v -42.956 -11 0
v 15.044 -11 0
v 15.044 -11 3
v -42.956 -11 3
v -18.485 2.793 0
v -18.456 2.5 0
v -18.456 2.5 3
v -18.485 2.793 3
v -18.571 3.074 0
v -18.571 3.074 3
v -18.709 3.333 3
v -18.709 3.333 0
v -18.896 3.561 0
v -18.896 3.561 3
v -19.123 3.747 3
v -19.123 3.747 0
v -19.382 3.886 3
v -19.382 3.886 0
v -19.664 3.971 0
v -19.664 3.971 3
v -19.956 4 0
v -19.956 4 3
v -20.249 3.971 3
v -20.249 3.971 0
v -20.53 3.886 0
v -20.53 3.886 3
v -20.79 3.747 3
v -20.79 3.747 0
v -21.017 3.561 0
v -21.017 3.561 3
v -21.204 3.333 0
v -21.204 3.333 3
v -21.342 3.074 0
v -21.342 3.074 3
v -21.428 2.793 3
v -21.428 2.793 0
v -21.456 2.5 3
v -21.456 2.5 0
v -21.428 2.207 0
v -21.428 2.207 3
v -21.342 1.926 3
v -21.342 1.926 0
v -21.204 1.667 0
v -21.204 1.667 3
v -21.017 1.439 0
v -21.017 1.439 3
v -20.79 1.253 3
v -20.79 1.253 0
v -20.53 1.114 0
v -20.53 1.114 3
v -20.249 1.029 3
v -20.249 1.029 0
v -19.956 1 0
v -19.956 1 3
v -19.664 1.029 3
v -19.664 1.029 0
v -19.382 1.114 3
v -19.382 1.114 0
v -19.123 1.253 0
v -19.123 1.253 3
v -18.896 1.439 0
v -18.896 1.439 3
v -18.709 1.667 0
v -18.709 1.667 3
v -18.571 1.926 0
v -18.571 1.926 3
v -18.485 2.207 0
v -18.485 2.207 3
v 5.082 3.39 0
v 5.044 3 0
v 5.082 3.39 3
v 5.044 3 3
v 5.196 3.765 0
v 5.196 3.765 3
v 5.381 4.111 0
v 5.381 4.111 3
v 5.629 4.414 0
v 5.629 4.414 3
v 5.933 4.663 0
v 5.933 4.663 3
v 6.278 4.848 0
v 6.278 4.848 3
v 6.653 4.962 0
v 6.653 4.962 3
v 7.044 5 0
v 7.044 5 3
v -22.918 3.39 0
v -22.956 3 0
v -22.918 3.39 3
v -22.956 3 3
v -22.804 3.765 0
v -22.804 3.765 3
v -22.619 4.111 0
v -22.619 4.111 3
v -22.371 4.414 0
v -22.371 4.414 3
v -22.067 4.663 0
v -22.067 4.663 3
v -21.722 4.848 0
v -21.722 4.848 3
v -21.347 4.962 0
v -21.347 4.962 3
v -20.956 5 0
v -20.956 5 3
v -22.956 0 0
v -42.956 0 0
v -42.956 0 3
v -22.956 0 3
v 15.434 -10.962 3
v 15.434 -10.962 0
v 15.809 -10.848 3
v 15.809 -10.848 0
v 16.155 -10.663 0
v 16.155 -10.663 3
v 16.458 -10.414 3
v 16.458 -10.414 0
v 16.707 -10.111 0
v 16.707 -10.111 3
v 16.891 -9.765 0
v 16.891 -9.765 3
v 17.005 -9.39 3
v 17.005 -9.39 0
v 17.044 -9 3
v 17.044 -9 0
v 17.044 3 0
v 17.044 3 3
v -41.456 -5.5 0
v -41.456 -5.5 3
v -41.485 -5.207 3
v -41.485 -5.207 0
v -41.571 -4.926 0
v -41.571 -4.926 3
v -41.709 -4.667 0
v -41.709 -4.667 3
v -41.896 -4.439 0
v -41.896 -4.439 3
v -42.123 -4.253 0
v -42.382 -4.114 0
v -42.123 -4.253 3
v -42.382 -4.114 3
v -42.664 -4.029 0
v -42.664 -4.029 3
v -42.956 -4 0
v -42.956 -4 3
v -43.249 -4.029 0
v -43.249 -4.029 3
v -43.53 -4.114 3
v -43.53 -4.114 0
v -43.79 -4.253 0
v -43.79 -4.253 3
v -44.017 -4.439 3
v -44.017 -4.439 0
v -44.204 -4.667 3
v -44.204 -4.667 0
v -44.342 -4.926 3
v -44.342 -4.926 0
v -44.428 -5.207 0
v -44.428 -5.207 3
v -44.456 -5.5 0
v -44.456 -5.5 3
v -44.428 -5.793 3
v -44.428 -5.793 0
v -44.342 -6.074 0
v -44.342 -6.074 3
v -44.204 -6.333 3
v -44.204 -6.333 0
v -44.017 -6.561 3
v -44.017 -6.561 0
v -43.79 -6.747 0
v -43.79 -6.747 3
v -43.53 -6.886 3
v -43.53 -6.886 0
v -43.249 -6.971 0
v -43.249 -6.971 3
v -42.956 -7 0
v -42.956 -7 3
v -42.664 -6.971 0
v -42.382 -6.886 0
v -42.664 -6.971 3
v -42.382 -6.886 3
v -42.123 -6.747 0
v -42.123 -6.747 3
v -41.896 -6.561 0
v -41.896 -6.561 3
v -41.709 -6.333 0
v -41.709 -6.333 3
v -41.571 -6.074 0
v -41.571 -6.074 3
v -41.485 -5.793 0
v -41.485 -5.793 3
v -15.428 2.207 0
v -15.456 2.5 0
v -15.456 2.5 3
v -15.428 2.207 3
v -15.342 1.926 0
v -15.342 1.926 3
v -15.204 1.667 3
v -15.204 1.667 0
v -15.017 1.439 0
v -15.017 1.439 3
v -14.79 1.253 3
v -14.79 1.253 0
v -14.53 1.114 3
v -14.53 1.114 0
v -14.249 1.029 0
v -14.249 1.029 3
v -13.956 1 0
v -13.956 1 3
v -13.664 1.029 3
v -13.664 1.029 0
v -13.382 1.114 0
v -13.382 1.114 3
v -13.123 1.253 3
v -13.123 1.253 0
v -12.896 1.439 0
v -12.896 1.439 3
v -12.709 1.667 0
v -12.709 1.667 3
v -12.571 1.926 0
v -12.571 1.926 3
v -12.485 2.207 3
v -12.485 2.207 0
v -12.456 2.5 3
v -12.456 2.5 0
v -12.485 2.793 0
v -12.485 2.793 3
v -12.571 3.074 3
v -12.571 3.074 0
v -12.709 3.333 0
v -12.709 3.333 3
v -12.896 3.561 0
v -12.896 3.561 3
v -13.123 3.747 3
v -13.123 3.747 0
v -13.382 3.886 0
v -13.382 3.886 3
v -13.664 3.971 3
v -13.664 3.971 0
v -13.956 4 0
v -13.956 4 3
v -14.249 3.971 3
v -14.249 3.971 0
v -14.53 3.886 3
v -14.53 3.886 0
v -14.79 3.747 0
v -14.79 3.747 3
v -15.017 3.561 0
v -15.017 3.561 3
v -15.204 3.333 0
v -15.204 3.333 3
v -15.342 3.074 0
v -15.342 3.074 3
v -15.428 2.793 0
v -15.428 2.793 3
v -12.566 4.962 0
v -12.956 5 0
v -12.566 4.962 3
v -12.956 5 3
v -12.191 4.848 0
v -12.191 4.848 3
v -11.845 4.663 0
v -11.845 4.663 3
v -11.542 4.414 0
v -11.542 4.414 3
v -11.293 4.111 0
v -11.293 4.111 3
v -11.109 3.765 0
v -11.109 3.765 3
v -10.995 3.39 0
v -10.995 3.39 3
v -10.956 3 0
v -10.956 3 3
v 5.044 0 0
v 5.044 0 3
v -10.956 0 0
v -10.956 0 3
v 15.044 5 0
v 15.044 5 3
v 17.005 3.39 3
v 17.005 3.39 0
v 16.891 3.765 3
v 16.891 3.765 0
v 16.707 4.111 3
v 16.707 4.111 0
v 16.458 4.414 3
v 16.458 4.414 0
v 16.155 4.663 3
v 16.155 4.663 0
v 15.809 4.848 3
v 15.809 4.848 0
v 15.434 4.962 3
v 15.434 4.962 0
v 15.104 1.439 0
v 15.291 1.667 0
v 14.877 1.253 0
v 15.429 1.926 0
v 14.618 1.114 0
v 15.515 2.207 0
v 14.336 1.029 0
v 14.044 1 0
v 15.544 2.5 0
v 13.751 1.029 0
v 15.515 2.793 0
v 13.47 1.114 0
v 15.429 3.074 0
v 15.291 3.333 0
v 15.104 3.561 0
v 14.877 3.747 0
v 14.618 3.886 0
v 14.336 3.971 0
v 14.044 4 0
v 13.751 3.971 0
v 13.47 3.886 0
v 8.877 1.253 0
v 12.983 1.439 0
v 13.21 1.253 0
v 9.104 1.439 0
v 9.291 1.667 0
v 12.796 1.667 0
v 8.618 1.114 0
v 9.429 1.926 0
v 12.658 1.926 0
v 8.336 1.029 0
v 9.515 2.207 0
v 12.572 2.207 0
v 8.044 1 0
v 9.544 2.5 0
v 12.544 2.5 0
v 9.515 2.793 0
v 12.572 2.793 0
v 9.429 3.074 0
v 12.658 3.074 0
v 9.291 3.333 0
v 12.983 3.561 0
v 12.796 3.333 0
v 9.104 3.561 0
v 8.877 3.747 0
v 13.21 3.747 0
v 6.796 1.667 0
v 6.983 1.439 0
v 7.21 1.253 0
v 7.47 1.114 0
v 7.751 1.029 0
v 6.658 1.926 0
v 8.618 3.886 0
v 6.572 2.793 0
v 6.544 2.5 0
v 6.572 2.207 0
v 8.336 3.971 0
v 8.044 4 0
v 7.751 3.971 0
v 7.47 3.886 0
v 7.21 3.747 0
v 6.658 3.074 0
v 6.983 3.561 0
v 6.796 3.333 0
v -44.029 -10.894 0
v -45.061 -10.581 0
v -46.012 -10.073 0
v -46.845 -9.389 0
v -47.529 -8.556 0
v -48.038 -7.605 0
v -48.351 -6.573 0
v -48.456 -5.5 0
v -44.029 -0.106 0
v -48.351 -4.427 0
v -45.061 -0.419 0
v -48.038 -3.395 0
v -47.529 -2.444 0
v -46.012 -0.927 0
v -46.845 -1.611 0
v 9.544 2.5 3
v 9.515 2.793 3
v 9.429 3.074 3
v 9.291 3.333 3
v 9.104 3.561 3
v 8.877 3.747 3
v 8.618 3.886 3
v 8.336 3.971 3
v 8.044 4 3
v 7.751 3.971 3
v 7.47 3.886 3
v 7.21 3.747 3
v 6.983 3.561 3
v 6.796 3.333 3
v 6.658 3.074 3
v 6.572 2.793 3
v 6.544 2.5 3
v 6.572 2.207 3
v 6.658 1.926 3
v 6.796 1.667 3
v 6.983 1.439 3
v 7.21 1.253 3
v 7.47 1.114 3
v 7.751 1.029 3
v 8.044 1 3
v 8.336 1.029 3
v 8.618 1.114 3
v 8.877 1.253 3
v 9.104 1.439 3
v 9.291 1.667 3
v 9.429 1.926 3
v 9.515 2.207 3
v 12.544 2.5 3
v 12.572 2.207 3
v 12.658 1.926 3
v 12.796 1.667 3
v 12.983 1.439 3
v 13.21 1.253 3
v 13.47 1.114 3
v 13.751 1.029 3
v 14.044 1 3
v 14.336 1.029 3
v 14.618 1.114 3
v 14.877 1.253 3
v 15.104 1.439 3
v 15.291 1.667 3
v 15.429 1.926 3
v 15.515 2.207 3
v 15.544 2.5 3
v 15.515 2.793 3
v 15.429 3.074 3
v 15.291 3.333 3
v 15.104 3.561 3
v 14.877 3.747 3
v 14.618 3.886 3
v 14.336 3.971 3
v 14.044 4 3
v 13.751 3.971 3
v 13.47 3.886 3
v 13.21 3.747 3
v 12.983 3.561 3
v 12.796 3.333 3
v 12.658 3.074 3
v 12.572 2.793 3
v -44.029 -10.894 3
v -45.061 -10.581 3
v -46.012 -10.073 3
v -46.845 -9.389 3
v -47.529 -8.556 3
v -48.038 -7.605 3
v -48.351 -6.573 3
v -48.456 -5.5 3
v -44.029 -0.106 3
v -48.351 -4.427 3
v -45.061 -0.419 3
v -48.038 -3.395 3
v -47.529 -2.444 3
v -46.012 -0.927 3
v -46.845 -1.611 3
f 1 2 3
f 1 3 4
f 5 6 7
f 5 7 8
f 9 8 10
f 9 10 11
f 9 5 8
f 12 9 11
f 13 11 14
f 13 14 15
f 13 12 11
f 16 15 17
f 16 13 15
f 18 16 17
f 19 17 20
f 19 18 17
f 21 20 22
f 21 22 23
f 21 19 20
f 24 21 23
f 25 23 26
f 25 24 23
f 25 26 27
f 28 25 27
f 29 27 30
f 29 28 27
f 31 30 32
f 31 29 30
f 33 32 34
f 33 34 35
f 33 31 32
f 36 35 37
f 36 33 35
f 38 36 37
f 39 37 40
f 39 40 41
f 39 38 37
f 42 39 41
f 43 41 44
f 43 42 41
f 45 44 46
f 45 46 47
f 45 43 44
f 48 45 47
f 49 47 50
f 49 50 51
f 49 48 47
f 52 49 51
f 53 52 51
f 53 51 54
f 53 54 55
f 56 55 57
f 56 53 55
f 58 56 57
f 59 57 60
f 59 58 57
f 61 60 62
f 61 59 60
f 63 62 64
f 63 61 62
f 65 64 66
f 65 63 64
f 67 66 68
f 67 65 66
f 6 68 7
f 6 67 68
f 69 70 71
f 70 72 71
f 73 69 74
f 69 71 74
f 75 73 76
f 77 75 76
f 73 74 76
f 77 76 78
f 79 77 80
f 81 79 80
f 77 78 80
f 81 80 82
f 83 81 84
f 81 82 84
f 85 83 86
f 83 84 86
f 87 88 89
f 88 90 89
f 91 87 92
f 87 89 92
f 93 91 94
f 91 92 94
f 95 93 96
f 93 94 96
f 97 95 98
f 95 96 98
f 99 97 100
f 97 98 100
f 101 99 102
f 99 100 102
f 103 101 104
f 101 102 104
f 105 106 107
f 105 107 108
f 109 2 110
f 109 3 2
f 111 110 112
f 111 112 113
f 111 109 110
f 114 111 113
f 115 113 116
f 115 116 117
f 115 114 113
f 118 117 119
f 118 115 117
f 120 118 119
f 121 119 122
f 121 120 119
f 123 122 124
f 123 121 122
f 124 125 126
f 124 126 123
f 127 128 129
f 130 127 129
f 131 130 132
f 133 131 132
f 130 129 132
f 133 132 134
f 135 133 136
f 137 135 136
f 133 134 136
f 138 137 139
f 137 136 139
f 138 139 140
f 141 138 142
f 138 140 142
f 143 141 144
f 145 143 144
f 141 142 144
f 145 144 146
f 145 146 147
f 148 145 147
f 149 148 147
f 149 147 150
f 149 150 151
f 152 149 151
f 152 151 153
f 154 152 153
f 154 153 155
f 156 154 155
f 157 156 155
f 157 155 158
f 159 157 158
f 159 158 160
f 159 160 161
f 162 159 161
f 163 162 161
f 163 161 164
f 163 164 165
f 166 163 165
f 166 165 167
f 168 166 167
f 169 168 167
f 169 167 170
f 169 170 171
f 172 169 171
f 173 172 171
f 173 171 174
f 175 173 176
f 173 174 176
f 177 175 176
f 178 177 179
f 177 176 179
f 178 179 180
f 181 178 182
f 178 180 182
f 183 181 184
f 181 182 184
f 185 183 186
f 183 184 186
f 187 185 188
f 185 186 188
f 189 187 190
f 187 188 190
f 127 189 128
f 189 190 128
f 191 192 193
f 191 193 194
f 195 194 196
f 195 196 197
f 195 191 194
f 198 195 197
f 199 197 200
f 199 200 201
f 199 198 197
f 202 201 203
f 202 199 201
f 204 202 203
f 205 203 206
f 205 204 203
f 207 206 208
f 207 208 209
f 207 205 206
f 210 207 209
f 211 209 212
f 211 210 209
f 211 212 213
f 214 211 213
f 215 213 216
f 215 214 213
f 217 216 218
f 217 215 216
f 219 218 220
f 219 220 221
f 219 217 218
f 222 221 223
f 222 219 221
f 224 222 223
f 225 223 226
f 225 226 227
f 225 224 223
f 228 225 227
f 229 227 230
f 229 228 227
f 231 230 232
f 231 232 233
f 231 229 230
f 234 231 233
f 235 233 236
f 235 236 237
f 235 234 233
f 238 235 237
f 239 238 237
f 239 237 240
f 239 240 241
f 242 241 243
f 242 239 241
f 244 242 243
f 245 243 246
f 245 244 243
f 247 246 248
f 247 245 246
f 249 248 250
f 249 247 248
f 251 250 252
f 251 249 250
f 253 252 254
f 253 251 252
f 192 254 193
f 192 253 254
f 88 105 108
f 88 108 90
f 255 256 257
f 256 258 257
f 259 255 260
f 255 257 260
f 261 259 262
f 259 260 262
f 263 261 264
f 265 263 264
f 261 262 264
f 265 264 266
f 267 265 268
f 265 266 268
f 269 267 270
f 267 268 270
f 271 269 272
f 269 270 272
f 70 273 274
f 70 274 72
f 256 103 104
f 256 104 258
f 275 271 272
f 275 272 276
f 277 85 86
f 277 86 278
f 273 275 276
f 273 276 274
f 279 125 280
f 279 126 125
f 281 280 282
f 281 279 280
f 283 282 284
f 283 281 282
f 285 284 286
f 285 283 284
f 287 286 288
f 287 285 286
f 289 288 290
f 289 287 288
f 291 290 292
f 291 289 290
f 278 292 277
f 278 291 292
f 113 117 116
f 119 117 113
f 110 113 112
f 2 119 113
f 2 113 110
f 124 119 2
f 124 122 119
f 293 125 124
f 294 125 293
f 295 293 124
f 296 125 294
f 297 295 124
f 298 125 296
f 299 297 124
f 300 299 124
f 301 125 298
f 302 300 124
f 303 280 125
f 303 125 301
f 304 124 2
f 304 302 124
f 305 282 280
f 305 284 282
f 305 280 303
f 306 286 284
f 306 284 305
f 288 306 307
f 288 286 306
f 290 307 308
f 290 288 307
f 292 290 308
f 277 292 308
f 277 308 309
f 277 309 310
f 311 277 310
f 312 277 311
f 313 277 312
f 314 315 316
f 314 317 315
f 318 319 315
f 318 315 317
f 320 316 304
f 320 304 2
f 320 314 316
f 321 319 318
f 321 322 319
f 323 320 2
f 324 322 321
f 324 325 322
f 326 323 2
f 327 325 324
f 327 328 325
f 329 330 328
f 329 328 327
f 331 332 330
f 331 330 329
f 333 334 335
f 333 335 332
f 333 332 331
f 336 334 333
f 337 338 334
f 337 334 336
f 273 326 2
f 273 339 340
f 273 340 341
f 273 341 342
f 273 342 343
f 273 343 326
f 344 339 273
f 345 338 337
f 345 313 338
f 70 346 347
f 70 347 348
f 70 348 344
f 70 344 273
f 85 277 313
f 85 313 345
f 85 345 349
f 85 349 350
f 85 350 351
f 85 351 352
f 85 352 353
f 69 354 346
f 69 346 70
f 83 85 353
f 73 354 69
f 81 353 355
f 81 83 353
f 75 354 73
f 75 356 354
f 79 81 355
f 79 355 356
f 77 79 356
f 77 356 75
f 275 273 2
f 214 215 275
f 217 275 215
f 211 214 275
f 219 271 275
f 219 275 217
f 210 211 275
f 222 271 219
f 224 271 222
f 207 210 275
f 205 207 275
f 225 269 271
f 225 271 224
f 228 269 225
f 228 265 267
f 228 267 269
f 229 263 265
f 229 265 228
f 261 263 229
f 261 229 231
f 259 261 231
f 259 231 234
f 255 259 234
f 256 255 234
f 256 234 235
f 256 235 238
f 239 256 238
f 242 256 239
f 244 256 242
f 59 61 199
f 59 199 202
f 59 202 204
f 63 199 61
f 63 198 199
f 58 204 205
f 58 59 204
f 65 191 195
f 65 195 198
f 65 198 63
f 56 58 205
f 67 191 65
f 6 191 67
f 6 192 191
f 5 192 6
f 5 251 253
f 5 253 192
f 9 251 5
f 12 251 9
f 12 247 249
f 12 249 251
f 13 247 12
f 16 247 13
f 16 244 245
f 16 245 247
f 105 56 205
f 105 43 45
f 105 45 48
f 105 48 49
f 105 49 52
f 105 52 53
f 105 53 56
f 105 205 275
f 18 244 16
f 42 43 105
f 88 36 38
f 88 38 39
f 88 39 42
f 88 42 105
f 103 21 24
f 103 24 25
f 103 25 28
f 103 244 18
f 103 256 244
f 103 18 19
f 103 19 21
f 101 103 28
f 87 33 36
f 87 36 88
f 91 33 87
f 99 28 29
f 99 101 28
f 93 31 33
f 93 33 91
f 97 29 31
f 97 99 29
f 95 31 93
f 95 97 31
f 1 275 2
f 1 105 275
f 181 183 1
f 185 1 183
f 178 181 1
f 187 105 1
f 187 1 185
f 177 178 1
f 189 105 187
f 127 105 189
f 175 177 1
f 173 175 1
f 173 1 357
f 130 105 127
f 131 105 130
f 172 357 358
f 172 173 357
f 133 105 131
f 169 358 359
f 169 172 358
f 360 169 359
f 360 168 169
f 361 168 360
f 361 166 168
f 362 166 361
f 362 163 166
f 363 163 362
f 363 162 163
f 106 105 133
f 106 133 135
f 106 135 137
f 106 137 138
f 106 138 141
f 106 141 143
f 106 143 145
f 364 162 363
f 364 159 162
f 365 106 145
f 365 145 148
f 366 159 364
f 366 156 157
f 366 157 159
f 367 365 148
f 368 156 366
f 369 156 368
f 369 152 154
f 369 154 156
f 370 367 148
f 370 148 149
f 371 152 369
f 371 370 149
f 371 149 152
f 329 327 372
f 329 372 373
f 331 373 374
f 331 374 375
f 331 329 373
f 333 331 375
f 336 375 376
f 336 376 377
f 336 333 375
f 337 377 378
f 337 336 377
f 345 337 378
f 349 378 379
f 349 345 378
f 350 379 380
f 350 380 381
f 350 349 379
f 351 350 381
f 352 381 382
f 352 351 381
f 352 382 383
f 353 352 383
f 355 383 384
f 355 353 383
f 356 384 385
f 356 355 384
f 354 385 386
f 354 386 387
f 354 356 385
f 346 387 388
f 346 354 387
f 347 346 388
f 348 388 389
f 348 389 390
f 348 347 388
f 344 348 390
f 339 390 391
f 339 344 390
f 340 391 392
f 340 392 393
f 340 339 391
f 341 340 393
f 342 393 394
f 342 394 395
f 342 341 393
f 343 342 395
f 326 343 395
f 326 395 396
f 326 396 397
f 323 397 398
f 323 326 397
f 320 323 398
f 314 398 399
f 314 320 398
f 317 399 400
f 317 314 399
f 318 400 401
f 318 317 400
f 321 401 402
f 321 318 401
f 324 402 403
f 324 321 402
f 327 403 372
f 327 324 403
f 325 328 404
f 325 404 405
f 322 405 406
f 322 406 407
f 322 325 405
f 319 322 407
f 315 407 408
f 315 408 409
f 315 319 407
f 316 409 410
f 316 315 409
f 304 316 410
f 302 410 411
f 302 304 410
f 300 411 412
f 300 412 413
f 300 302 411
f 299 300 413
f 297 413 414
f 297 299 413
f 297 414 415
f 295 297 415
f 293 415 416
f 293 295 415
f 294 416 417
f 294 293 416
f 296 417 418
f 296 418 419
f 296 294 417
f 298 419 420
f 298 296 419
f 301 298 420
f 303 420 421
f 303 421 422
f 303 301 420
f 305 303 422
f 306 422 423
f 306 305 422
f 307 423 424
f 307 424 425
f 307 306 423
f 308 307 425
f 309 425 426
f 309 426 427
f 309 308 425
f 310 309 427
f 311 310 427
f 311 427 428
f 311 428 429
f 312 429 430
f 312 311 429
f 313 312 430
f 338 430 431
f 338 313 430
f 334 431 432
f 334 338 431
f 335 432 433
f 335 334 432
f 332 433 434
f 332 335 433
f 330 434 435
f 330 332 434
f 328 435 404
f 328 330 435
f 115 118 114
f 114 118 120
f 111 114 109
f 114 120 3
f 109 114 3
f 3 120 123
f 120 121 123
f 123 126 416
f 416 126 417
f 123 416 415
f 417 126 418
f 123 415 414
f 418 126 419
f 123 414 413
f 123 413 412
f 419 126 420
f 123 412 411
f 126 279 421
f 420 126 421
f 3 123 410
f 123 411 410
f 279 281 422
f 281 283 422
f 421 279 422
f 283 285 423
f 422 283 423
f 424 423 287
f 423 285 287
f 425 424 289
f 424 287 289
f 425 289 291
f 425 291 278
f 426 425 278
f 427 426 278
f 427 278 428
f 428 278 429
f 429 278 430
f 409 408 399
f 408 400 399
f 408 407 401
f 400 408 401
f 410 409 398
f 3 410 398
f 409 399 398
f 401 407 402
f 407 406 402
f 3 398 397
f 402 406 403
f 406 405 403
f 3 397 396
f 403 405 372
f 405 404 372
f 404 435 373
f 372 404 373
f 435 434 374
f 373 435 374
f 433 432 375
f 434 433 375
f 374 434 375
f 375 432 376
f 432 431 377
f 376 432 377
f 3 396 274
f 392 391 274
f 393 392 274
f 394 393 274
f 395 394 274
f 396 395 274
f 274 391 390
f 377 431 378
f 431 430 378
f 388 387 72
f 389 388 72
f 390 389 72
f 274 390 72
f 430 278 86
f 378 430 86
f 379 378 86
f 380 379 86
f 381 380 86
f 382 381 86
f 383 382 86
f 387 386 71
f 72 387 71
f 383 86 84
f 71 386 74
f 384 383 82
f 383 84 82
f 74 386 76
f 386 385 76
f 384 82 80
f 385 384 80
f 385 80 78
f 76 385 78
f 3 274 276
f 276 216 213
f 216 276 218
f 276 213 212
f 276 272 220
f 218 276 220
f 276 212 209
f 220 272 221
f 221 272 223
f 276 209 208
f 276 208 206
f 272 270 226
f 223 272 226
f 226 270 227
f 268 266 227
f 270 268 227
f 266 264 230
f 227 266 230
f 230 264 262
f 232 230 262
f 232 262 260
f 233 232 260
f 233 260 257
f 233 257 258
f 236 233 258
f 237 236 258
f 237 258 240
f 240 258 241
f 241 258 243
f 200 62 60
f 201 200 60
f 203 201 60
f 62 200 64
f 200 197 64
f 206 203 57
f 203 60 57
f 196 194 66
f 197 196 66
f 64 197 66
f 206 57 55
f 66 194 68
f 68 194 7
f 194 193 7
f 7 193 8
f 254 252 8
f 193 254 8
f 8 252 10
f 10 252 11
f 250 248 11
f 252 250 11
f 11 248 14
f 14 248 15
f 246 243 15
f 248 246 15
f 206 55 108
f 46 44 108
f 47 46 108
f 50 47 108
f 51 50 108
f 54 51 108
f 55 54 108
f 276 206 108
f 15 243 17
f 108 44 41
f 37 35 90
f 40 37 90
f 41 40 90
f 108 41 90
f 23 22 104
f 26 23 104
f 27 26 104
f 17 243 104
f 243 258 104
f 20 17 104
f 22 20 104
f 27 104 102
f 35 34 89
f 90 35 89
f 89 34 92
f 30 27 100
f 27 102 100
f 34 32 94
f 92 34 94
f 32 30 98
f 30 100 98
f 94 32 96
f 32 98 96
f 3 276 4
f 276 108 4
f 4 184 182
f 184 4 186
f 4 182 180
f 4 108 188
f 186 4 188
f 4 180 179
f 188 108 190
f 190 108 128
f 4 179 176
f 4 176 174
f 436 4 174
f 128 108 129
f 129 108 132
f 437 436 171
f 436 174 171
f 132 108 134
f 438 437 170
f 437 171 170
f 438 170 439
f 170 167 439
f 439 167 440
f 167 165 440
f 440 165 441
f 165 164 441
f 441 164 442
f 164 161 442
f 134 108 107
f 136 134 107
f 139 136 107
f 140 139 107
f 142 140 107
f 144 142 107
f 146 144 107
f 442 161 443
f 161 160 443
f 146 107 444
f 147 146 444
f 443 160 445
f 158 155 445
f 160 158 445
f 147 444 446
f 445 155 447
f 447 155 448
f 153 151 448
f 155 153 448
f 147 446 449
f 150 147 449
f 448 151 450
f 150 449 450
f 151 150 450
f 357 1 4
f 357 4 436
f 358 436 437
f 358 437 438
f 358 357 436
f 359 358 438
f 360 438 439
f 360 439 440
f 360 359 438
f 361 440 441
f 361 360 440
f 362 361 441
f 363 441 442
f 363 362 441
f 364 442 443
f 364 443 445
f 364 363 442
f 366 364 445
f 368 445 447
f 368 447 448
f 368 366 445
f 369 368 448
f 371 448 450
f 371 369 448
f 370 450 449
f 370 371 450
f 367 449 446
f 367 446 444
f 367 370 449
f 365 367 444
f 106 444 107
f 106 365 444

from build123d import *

# Parameters (mm, degrees)
ESQUISSE1_R             = 1.5
BOSS_EXTRU_1_DEPTH      = 3
ESQUISSE2_R             = 1.5
ENL_V_MAT_EXTRU_1_DEPTH = 50.779679597
CONG_1_R                = 2


with BuildPart() as part:
    # Esquisse1 → Boss.-Extru.1 (new body)
    with BuildSketch(Plane.XY):
        with BuildLine():
            Line((-22.956336023, 0), (-22.956336023, 5))
            Line((-22.956336023, 5), (-10.956336023, 5))
            Line((-10.956336023, 5), (-10.956336023, 0))
            Line((-10.956336023, 0), (5.043663977, 0))
            Line((5.043663977, 0), (5.043663977, 5))
            Line((5.043663977, 5), (17.043663977, 5))
            Line((17.043663977, 5), (17.043663977, -11))
            Line((17.043663977, -11), (-42.956336023, -11))
            ThreePointArc((-42.956336023, -11), (-48.456336023, -5.5), (-42.956336023, 0))
            Line((-42.956336023, 0), (-22.956336023, 0))
        make_face()
        with Locations((-19.956336023, 2.5)):
            Circle(ESQUISSE1_R, mode=Mode.SUBTRACT)
        with Locations(Location((-13.956336023, 2.5, 0), (0, 0, 180))):
            Circle(ESQUISSE1_R, mode=Mode.SUBTRACT)
        with Locations((8.043663977, 2.5)):
            Circle(ESQUISSE1_R, mode=Mode.SUBTRACT)
        with Locations(Location((14.043663977, 2.5, 0), (0, 0, 180))):
            Circle(ESQUISSE1_R, mode=Mode.SUBTRACT)
    extrude(amount=BOSS_EXTRU_1_DEPTH)

    # Esquisse2 → Enlèv. mat.-Extru.1 (cut, through all)
    with BuildSketch(Plane.XY.offset(3)):
        with Locations((-42.956336023, -5.5)):
            Circle(ESQUISSE2_R)
    extrude(amount=-ENL_V_MAT_EXTRU_1_DEPTH, mode=Mode.SUBTRACT)

    # Congé1
    cong_1_edges = [part.edges().sort_by_distance(p)[0] for p in [
        (-22.956336023, 5, 1.5),
        (-10.956336023, 5, 1.5),
        (5.043663977, 5, 1.5),
        (17.043663977, 5, 1.5),
        (17.043663977, -11, 1.5),
    ]]
    fillet(cong_1_edges, radius=CONG_1_R)


solid = part.part
